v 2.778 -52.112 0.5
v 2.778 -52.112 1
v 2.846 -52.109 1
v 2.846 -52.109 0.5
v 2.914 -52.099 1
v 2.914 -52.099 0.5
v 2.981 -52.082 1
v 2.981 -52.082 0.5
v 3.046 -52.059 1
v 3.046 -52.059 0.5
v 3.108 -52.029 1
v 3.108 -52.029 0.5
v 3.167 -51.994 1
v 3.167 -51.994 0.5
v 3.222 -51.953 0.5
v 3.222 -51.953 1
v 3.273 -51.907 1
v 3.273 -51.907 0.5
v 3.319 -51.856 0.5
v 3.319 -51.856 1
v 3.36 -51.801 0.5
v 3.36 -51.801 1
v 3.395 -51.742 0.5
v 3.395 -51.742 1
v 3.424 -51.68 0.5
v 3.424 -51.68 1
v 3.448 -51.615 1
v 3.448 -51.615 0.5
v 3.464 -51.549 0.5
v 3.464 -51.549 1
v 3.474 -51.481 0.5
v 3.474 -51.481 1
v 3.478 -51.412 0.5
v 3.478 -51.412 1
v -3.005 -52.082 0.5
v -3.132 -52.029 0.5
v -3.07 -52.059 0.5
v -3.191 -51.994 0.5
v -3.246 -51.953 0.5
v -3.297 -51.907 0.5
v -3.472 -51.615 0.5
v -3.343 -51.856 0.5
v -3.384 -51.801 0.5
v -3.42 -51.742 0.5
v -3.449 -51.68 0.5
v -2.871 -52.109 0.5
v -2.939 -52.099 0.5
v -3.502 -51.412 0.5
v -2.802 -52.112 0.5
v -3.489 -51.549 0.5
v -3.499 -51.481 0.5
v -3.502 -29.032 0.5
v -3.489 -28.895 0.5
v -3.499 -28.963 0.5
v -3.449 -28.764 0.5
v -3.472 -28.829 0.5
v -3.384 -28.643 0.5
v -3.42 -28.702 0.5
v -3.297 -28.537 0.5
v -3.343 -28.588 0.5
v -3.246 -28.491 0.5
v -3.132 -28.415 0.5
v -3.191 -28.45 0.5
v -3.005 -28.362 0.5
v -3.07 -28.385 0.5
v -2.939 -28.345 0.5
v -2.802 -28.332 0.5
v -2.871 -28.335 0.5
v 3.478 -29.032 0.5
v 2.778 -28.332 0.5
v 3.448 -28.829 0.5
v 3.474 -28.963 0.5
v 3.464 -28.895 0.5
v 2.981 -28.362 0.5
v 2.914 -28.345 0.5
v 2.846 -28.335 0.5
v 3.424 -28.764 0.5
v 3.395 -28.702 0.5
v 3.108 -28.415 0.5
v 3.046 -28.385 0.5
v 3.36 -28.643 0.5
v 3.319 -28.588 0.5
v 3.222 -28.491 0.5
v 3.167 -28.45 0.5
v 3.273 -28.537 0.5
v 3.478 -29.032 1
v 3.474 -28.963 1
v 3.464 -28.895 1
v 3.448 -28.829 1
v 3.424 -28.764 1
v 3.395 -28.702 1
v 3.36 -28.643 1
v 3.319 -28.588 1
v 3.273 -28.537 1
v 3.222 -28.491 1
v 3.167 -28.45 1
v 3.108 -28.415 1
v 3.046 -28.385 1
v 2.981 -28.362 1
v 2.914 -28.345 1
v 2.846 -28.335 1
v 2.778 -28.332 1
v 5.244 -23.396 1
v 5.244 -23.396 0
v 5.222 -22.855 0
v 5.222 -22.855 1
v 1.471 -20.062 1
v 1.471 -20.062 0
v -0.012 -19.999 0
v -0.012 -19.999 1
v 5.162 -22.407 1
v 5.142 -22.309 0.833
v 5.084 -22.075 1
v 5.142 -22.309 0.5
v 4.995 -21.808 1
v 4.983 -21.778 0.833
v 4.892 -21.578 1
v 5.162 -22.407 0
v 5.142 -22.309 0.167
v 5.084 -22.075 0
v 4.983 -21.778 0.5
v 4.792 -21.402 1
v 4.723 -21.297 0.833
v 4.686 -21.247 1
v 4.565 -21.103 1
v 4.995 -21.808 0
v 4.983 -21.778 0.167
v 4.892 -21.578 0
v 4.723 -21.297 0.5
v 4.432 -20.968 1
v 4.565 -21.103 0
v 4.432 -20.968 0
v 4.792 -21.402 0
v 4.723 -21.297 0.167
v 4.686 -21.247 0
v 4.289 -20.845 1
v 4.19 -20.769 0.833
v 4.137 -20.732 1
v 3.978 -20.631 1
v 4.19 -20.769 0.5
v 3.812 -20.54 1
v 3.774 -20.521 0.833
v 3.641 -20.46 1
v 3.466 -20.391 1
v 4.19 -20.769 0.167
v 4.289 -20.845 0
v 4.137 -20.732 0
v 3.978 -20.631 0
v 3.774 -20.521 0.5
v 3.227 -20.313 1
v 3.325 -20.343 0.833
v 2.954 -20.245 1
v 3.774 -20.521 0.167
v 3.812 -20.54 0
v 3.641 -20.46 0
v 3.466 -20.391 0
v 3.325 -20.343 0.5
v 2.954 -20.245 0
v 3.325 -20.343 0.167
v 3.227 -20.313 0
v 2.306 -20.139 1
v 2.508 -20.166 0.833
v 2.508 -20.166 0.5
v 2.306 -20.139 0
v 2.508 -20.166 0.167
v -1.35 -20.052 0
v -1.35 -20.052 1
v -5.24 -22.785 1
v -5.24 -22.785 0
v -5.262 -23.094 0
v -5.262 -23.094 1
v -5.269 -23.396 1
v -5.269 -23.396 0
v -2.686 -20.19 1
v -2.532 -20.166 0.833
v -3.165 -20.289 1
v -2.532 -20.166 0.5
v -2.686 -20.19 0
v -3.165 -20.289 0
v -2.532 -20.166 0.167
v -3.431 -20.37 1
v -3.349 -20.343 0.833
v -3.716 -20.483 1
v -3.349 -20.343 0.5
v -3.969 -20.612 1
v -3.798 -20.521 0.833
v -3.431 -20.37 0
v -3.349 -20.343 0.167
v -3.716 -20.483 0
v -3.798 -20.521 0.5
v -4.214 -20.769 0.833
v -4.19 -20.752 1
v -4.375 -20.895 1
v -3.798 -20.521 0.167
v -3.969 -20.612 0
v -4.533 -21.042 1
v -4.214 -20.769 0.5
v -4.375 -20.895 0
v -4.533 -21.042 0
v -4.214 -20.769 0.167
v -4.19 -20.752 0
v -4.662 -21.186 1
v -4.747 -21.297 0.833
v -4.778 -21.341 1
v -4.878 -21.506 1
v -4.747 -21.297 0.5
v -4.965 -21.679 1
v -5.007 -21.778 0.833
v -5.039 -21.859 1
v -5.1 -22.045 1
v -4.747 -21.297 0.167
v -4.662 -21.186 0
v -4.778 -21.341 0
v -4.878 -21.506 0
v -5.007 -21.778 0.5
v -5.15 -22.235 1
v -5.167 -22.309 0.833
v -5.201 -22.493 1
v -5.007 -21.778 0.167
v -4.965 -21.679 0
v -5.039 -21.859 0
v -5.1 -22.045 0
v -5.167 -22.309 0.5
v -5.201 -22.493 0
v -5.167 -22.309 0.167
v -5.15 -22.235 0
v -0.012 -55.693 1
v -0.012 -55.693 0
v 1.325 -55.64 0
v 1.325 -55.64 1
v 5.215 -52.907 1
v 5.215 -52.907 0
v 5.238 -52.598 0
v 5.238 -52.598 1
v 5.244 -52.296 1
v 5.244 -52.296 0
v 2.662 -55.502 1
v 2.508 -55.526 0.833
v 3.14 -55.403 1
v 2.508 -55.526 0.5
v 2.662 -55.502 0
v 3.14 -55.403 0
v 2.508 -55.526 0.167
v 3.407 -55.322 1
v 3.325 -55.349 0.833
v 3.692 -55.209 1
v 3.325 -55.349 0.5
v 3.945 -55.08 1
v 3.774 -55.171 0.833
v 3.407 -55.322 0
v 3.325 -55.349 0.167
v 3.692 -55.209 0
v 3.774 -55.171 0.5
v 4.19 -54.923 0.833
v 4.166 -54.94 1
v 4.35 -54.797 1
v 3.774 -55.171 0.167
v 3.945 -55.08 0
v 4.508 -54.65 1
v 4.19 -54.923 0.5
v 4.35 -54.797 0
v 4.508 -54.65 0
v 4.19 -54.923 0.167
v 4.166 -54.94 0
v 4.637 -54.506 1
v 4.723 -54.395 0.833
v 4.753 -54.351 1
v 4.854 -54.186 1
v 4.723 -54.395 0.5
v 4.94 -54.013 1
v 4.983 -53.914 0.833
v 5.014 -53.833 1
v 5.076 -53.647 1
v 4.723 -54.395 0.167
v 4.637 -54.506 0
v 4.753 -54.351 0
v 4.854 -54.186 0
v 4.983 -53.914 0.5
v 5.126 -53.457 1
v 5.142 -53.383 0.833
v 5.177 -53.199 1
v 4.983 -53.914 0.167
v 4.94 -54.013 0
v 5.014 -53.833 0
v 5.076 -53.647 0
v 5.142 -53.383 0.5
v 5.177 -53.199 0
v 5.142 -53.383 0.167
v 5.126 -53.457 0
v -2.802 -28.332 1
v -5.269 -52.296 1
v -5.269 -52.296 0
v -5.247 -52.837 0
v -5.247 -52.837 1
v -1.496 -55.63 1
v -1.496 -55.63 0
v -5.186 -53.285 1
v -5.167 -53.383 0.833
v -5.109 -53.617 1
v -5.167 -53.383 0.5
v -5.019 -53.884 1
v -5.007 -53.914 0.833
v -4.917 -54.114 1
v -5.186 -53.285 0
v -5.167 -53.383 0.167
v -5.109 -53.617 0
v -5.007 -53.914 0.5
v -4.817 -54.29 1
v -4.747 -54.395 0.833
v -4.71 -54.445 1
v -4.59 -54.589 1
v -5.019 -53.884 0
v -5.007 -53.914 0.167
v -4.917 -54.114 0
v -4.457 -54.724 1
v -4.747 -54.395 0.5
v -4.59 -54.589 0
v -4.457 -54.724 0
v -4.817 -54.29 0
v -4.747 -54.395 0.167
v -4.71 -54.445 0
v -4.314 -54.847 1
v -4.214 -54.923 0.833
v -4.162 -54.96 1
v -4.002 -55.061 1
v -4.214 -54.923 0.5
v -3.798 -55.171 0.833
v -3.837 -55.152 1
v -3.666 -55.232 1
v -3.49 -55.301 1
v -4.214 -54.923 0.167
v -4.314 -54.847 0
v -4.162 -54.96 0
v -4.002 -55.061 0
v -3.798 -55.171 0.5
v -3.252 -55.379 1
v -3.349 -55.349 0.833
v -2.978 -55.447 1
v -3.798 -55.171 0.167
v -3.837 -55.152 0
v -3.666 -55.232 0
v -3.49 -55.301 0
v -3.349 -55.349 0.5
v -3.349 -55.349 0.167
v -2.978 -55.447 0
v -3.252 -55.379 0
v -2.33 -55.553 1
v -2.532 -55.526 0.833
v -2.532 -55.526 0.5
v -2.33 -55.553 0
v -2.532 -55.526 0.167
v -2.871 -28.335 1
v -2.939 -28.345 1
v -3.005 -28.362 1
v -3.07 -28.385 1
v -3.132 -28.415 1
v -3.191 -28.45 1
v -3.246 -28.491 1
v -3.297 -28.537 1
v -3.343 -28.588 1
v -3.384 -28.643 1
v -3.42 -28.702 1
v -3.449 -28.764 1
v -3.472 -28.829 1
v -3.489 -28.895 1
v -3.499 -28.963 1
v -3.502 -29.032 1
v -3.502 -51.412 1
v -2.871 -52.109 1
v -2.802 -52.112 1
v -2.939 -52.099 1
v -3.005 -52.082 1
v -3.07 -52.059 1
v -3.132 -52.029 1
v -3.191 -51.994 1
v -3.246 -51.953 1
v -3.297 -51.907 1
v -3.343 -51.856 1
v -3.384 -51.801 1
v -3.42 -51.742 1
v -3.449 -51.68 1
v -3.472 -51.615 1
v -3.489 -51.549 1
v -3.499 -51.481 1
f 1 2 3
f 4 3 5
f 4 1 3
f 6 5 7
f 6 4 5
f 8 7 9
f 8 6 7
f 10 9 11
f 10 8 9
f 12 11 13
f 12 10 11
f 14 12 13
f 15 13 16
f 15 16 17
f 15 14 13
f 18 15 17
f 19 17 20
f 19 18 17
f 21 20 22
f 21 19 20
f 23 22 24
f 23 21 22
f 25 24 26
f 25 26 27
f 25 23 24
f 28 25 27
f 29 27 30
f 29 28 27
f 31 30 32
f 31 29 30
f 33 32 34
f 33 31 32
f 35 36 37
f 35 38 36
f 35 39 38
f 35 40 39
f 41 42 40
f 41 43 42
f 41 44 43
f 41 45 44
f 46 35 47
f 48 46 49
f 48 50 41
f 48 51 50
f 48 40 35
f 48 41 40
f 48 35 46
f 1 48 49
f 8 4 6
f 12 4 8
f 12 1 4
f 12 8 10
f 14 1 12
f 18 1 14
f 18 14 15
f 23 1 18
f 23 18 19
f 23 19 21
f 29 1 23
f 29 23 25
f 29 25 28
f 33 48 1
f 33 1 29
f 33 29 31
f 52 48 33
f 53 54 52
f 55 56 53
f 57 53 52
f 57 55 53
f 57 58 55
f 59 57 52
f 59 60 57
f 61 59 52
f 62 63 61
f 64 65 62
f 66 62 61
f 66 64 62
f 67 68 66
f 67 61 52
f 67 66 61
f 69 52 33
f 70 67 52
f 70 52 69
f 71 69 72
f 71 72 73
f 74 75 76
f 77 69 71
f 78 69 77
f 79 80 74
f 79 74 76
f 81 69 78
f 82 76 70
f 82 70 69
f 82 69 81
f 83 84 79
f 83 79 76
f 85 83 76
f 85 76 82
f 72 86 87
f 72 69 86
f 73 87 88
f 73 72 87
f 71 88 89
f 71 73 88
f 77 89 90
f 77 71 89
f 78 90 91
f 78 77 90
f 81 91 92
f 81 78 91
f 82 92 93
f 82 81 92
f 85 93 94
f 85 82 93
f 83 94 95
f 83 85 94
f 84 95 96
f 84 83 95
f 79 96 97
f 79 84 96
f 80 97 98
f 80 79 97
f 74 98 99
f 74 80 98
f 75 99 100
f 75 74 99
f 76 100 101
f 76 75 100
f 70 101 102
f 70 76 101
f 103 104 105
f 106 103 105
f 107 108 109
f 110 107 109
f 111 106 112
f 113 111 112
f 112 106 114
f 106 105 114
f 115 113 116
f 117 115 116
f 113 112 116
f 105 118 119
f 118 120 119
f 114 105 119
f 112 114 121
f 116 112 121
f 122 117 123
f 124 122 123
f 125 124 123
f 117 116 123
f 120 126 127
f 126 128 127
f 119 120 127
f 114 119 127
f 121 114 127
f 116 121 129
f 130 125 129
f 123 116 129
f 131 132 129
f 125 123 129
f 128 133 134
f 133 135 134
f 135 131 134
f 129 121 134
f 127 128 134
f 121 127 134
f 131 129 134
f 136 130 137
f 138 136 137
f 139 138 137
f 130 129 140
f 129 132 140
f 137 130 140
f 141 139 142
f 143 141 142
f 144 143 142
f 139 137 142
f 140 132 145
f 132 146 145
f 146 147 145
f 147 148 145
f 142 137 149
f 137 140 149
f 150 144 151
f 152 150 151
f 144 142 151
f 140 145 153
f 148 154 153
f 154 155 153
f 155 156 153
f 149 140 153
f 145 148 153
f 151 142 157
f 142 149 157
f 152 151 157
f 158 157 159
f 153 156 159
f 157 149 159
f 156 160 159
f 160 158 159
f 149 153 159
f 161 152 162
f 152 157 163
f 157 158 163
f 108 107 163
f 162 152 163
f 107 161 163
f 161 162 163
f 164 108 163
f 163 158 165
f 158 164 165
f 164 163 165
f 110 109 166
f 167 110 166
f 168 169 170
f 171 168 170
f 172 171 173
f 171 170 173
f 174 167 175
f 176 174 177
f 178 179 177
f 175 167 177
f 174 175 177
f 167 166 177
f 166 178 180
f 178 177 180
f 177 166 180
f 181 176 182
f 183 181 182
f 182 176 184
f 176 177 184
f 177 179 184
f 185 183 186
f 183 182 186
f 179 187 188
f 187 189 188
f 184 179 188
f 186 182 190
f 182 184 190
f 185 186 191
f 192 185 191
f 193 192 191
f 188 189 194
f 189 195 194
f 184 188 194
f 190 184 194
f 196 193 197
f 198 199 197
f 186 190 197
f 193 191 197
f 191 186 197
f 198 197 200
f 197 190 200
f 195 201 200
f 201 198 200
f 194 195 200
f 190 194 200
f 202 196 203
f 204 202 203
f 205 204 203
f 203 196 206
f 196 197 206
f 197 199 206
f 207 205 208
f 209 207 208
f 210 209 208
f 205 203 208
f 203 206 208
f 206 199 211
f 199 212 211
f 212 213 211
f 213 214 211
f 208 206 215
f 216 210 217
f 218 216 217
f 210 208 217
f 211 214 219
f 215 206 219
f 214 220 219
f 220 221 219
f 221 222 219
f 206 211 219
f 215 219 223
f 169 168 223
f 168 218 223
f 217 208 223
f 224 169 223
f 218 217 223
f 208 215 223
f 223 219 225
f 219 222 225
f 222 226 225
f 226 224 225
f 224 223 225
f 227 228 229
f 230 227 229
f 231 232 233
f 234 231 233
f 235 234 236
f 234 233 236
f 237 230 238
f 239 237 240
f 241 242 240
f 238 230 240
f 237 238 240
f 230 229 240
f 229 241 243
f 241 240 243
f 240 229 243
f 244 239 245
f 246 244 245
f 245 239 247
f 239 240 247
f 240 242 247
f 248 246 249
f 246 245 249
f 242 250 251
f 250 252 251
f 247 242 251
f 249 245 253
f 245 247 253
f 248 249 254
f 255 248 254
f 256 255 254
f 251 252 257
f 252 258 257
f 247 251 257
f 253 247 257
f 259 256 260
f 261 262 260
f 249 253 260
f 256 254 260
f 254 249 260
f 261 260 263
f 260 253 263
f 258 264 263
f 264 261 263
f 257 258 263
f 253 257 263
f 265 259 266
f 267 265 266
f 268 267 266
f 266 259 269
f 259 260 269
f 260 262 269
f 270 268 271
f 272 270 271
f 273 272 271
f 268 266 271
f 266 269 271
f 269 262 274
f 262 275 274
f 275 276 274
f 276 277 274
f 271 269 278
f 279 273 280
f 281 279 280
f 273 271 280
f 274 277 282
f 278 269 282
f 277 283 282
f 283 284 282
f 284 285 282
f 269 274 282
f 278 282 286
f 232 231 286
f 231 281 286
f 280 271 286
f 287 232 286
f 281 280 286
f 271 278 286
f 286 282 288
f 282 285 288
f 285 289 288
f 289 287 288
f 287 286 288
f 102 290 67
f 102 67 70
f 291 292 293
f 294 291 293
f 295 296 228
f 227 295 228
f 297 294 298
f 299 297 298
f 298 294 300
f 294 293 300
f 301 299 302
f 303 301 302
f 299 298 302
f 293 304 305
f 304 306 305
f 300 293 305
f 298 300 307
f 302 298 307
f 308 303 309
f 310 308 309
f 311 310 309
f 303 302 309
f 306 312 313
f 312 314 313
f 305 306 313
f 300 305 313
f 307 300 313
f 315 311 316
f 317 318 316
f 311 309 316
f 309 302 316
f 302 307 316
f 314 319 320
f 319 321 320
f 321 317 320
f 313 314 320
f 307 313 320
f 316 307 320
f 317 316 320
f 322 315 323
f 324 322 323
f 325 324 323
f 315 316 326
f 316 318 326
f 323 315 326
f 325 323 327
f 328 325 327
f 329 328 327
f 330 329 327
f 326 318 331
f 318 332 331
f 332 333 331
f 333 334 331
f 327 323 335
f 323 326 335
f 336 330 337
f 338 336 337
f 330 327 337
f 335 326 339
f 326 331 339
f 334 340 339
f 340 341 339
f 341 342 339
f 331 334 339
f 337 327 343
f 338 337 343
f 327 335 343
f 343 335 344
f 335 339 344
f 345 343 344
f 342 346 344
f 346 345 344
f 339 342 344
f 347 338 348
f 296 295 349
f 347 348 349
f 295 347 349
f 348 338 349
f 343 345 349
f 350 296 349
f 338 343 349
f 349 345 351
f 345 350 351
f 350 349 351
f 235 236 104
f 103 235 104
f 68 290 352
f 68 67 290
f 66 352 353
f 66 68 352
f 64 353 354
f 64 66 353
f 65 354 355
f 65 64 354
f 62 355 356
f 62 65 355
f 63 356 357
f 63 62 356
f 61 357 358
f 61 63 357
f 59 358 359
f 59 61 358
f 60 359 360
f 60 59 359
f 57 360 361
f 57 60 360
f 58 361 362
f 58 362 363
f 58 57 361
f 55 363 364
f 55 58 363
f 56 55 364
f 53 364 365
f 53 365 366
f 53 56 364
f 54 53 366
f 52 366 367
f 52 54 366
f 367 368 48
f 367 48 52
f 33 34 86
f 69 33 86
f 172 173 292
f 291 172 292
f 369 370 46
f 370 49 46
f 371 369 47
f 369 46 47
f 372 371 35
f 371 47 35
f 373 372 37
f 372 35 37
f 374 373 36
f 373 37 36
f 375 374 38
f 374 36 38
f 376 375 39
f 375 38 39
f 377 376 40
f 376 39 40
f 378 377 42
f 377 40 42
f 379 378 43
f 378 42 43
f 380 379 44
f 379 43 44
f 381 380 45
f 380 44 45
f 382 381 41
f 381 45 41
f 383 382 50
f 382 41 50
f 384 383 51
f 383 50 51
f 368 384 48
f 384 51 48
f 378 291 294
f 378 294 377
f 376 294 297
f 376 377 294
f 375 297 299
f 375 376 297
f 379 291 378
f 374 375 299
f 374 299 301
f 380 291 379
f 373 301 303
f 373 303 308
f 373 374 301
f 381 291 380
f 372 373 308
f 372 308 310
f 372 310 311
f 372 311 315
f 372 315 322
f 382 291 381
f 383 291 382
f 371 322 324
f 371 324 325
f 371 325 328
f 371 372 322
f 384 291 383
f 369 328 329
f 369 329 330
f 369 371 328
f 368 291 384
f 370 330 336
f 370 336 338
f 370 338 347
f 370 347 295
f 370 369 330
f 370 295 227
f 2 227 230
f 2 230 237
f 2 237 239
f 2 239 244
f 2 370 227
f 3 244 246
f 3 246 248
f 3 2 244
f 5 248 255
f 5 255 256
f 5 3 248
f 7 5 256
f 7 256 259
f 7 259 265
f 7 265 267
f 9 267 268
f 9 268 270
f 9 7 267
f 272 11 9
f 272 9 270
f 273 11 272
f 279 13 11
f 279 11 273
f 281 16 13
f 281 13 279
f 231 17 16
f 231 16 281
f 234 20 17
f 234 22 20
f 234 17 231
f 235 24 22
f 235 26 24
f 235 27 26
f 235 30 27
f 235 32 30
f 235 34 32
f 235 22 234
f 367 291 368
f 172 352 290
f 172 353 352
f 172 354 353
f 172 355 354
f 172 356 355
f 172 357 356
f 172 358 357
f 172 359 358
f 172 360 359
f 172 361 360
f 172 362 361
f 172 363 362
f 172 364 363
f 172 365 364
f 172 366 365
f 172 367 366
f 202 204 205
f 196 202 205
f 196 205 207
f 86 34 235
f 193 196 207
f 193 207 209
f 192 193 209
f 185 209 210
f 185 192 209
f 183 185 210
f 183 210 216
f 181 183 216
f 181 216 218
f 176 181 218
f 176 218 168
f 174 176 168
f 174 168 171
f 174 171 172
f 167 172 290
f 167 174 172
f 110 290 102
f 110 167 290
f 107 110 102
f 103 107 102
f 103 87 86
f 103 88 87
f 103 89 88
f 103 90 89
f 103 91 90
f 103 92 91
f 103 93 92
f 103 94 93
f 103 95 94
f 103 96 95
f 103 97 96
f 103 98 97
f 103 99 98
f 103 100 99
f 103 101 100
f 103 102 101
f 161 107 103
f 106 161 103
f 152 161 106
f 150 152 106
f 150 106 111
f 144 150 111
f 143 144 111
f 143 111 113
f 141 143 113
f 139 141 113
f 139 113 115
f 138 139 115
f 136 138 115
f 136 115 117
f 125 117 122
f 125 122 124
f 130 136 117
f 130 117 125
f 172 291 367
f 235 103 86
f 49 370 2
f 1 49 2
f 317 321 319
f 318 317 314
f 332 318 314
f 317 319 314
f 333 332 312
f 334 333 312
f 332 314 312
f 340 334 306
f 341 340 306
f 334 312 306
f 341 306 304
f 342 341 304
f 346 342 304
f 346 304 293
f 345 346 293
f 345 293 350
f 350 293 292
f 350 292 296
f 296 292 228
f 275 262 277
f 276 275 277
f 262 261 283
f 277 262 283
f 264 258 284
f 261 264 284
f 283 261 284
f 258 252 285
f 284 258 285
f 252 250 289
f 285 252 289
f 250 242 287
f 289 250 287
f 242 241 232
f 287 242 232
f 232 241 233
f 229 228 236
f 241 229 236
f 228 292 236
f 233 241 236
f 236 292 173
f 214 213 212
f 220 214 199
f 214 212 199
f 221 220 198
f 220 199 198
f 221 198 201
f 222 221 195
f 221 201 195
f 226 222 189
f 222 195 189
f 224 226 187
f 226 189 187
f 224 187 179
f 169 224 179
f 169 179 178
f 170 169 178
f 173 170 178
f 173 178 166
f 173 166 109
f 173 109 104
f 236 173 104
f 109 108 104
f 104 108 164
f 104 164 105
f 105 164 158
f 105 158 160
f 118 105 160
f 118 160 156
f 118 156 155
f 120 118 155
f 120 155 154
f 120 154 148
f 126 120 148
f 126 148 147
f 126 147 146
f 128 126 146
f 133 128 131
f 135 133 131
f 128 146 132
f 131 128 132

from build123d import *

# Parameters (mm, degrees)
EXTRUDE_1_DEPTH     = 1
SKETCH_6_W          = 6.979999977
SKETCH_6_H          = 23.78
CUT_EXTRUDE_1_DEPTH = 0.5
FILLET_1_R          = 0.7


with BuildPart() as part:
    # 草图1 → 凸台-拉伸1 (new body)
    with BuildSketch(Plane.XY):
        with BuildLine():
            Line((-5.268787068, -23.395653078), (-5.268787078, -52.29634699))
            add(Edge.make_bspline(
                [(-5.268787078, -52.29634699), (-5.268787078, -52.990318083), (-5.137001379, -54.080149918), (-4.182317261, -55.003717165), (-3.39928825, -55.373199943), (-2.383654985, -55.567305407), (-1.243870186, -55.650276692), (-0.457601939, -55.692931511), (-0.012274069, -55.692882673)],
                knots=[0, 0, 0, 0, 0.301160008, 0.404454001, 0.537204471, 0.652206641, 0.831341381, 1, 1, 1, 1], degree=3))
            add(Edge.make_bspline(
                [(-0.012274069, -55.692882673), (0.433053802, -55.692931511), (1.219322049, -55.650276693), (2.359106848, -55.567305408), (3.374740114, -55.373199945), (4.157769124, -55.003717168), (5.112453243, -54.080149921), (5.244238943, -52.990318087), (5.244238943, -52.296346994)],
                knots=[0, 0, 0, 0, 0.168658619, 0.347793359, 0.462795529, 0.595545999, 0.698839992, 1, 1, 1, 1], degree=3))
            Line((5.244238943, -52.296346994), (5.244238953, -23.395653081))
            add(Edge.make_bspline(
                [(5.244238953, -23.395653081), (5.244238953, -22.701681988), (5.112453254, -21.611850154), (4.157769136, -20.688282907), (3.374740126, -20.318800129), (2.359106861, -20.124694665), (1.219322061, -20.041723379), (0.433053814, -19.999068561), (-0.012274056, -19.999117399)],
                knots=[0, 0, 0, 0, 0.301160008, 0.404454001, 0.537204471, 0.652206641, 0.831341381, 1, 1, 1, 1], degree=3))
            add(Edge.make_bspline(
                [(-0.012274056, -19.999117399), (-0.457601926, -19.999068561), (-1.243870174, -20.041723378), (-2.383654973, -20.124694663), (-3.399288238, -20.318800126), (-4.182317249, -20.688282904), (-5.137001368, -21.61185015), (-5.268787067, -22.701681985), (-5.268787068, -23.395653078)],
                knots=[0, 0, 0, 0, 0.168658619, 0.347793359, 0.462795529, 0.595545999, 0.698839992, 1, 1, 1, 1], degree=3))
        make_face()
    extrude(amount=EXTRUDE_1_DEPTH)

    # 草图6 → 切除-拉伸1 (cut)
    with BuildSketch(Plane.XY.offset(1)):
        with Locations((-0.012274056, -40.222000037)):
            Rectangle(SKETCH_6_W, SKETCH_6_H)
    extrude(amount=-CUT_EXTRUDE_1_DEPTH, mode=Mode.SUBTRACT)

    # 圆角1
    fillet_1_edges = [part.edges().sort_by_distance(p)[0] for p in [
        (3.477725932, -52.112000037, 0.75),
        (-3.502274045, -52.112000037, 0.75),
        (-3.502274045, -28.332000037, 0.75),
        (3.477725932, -28.332000037, 0.75),
    ]]
    fillet(fillet_1_edges, radius=FILLET_1_R)


solid = part.part
